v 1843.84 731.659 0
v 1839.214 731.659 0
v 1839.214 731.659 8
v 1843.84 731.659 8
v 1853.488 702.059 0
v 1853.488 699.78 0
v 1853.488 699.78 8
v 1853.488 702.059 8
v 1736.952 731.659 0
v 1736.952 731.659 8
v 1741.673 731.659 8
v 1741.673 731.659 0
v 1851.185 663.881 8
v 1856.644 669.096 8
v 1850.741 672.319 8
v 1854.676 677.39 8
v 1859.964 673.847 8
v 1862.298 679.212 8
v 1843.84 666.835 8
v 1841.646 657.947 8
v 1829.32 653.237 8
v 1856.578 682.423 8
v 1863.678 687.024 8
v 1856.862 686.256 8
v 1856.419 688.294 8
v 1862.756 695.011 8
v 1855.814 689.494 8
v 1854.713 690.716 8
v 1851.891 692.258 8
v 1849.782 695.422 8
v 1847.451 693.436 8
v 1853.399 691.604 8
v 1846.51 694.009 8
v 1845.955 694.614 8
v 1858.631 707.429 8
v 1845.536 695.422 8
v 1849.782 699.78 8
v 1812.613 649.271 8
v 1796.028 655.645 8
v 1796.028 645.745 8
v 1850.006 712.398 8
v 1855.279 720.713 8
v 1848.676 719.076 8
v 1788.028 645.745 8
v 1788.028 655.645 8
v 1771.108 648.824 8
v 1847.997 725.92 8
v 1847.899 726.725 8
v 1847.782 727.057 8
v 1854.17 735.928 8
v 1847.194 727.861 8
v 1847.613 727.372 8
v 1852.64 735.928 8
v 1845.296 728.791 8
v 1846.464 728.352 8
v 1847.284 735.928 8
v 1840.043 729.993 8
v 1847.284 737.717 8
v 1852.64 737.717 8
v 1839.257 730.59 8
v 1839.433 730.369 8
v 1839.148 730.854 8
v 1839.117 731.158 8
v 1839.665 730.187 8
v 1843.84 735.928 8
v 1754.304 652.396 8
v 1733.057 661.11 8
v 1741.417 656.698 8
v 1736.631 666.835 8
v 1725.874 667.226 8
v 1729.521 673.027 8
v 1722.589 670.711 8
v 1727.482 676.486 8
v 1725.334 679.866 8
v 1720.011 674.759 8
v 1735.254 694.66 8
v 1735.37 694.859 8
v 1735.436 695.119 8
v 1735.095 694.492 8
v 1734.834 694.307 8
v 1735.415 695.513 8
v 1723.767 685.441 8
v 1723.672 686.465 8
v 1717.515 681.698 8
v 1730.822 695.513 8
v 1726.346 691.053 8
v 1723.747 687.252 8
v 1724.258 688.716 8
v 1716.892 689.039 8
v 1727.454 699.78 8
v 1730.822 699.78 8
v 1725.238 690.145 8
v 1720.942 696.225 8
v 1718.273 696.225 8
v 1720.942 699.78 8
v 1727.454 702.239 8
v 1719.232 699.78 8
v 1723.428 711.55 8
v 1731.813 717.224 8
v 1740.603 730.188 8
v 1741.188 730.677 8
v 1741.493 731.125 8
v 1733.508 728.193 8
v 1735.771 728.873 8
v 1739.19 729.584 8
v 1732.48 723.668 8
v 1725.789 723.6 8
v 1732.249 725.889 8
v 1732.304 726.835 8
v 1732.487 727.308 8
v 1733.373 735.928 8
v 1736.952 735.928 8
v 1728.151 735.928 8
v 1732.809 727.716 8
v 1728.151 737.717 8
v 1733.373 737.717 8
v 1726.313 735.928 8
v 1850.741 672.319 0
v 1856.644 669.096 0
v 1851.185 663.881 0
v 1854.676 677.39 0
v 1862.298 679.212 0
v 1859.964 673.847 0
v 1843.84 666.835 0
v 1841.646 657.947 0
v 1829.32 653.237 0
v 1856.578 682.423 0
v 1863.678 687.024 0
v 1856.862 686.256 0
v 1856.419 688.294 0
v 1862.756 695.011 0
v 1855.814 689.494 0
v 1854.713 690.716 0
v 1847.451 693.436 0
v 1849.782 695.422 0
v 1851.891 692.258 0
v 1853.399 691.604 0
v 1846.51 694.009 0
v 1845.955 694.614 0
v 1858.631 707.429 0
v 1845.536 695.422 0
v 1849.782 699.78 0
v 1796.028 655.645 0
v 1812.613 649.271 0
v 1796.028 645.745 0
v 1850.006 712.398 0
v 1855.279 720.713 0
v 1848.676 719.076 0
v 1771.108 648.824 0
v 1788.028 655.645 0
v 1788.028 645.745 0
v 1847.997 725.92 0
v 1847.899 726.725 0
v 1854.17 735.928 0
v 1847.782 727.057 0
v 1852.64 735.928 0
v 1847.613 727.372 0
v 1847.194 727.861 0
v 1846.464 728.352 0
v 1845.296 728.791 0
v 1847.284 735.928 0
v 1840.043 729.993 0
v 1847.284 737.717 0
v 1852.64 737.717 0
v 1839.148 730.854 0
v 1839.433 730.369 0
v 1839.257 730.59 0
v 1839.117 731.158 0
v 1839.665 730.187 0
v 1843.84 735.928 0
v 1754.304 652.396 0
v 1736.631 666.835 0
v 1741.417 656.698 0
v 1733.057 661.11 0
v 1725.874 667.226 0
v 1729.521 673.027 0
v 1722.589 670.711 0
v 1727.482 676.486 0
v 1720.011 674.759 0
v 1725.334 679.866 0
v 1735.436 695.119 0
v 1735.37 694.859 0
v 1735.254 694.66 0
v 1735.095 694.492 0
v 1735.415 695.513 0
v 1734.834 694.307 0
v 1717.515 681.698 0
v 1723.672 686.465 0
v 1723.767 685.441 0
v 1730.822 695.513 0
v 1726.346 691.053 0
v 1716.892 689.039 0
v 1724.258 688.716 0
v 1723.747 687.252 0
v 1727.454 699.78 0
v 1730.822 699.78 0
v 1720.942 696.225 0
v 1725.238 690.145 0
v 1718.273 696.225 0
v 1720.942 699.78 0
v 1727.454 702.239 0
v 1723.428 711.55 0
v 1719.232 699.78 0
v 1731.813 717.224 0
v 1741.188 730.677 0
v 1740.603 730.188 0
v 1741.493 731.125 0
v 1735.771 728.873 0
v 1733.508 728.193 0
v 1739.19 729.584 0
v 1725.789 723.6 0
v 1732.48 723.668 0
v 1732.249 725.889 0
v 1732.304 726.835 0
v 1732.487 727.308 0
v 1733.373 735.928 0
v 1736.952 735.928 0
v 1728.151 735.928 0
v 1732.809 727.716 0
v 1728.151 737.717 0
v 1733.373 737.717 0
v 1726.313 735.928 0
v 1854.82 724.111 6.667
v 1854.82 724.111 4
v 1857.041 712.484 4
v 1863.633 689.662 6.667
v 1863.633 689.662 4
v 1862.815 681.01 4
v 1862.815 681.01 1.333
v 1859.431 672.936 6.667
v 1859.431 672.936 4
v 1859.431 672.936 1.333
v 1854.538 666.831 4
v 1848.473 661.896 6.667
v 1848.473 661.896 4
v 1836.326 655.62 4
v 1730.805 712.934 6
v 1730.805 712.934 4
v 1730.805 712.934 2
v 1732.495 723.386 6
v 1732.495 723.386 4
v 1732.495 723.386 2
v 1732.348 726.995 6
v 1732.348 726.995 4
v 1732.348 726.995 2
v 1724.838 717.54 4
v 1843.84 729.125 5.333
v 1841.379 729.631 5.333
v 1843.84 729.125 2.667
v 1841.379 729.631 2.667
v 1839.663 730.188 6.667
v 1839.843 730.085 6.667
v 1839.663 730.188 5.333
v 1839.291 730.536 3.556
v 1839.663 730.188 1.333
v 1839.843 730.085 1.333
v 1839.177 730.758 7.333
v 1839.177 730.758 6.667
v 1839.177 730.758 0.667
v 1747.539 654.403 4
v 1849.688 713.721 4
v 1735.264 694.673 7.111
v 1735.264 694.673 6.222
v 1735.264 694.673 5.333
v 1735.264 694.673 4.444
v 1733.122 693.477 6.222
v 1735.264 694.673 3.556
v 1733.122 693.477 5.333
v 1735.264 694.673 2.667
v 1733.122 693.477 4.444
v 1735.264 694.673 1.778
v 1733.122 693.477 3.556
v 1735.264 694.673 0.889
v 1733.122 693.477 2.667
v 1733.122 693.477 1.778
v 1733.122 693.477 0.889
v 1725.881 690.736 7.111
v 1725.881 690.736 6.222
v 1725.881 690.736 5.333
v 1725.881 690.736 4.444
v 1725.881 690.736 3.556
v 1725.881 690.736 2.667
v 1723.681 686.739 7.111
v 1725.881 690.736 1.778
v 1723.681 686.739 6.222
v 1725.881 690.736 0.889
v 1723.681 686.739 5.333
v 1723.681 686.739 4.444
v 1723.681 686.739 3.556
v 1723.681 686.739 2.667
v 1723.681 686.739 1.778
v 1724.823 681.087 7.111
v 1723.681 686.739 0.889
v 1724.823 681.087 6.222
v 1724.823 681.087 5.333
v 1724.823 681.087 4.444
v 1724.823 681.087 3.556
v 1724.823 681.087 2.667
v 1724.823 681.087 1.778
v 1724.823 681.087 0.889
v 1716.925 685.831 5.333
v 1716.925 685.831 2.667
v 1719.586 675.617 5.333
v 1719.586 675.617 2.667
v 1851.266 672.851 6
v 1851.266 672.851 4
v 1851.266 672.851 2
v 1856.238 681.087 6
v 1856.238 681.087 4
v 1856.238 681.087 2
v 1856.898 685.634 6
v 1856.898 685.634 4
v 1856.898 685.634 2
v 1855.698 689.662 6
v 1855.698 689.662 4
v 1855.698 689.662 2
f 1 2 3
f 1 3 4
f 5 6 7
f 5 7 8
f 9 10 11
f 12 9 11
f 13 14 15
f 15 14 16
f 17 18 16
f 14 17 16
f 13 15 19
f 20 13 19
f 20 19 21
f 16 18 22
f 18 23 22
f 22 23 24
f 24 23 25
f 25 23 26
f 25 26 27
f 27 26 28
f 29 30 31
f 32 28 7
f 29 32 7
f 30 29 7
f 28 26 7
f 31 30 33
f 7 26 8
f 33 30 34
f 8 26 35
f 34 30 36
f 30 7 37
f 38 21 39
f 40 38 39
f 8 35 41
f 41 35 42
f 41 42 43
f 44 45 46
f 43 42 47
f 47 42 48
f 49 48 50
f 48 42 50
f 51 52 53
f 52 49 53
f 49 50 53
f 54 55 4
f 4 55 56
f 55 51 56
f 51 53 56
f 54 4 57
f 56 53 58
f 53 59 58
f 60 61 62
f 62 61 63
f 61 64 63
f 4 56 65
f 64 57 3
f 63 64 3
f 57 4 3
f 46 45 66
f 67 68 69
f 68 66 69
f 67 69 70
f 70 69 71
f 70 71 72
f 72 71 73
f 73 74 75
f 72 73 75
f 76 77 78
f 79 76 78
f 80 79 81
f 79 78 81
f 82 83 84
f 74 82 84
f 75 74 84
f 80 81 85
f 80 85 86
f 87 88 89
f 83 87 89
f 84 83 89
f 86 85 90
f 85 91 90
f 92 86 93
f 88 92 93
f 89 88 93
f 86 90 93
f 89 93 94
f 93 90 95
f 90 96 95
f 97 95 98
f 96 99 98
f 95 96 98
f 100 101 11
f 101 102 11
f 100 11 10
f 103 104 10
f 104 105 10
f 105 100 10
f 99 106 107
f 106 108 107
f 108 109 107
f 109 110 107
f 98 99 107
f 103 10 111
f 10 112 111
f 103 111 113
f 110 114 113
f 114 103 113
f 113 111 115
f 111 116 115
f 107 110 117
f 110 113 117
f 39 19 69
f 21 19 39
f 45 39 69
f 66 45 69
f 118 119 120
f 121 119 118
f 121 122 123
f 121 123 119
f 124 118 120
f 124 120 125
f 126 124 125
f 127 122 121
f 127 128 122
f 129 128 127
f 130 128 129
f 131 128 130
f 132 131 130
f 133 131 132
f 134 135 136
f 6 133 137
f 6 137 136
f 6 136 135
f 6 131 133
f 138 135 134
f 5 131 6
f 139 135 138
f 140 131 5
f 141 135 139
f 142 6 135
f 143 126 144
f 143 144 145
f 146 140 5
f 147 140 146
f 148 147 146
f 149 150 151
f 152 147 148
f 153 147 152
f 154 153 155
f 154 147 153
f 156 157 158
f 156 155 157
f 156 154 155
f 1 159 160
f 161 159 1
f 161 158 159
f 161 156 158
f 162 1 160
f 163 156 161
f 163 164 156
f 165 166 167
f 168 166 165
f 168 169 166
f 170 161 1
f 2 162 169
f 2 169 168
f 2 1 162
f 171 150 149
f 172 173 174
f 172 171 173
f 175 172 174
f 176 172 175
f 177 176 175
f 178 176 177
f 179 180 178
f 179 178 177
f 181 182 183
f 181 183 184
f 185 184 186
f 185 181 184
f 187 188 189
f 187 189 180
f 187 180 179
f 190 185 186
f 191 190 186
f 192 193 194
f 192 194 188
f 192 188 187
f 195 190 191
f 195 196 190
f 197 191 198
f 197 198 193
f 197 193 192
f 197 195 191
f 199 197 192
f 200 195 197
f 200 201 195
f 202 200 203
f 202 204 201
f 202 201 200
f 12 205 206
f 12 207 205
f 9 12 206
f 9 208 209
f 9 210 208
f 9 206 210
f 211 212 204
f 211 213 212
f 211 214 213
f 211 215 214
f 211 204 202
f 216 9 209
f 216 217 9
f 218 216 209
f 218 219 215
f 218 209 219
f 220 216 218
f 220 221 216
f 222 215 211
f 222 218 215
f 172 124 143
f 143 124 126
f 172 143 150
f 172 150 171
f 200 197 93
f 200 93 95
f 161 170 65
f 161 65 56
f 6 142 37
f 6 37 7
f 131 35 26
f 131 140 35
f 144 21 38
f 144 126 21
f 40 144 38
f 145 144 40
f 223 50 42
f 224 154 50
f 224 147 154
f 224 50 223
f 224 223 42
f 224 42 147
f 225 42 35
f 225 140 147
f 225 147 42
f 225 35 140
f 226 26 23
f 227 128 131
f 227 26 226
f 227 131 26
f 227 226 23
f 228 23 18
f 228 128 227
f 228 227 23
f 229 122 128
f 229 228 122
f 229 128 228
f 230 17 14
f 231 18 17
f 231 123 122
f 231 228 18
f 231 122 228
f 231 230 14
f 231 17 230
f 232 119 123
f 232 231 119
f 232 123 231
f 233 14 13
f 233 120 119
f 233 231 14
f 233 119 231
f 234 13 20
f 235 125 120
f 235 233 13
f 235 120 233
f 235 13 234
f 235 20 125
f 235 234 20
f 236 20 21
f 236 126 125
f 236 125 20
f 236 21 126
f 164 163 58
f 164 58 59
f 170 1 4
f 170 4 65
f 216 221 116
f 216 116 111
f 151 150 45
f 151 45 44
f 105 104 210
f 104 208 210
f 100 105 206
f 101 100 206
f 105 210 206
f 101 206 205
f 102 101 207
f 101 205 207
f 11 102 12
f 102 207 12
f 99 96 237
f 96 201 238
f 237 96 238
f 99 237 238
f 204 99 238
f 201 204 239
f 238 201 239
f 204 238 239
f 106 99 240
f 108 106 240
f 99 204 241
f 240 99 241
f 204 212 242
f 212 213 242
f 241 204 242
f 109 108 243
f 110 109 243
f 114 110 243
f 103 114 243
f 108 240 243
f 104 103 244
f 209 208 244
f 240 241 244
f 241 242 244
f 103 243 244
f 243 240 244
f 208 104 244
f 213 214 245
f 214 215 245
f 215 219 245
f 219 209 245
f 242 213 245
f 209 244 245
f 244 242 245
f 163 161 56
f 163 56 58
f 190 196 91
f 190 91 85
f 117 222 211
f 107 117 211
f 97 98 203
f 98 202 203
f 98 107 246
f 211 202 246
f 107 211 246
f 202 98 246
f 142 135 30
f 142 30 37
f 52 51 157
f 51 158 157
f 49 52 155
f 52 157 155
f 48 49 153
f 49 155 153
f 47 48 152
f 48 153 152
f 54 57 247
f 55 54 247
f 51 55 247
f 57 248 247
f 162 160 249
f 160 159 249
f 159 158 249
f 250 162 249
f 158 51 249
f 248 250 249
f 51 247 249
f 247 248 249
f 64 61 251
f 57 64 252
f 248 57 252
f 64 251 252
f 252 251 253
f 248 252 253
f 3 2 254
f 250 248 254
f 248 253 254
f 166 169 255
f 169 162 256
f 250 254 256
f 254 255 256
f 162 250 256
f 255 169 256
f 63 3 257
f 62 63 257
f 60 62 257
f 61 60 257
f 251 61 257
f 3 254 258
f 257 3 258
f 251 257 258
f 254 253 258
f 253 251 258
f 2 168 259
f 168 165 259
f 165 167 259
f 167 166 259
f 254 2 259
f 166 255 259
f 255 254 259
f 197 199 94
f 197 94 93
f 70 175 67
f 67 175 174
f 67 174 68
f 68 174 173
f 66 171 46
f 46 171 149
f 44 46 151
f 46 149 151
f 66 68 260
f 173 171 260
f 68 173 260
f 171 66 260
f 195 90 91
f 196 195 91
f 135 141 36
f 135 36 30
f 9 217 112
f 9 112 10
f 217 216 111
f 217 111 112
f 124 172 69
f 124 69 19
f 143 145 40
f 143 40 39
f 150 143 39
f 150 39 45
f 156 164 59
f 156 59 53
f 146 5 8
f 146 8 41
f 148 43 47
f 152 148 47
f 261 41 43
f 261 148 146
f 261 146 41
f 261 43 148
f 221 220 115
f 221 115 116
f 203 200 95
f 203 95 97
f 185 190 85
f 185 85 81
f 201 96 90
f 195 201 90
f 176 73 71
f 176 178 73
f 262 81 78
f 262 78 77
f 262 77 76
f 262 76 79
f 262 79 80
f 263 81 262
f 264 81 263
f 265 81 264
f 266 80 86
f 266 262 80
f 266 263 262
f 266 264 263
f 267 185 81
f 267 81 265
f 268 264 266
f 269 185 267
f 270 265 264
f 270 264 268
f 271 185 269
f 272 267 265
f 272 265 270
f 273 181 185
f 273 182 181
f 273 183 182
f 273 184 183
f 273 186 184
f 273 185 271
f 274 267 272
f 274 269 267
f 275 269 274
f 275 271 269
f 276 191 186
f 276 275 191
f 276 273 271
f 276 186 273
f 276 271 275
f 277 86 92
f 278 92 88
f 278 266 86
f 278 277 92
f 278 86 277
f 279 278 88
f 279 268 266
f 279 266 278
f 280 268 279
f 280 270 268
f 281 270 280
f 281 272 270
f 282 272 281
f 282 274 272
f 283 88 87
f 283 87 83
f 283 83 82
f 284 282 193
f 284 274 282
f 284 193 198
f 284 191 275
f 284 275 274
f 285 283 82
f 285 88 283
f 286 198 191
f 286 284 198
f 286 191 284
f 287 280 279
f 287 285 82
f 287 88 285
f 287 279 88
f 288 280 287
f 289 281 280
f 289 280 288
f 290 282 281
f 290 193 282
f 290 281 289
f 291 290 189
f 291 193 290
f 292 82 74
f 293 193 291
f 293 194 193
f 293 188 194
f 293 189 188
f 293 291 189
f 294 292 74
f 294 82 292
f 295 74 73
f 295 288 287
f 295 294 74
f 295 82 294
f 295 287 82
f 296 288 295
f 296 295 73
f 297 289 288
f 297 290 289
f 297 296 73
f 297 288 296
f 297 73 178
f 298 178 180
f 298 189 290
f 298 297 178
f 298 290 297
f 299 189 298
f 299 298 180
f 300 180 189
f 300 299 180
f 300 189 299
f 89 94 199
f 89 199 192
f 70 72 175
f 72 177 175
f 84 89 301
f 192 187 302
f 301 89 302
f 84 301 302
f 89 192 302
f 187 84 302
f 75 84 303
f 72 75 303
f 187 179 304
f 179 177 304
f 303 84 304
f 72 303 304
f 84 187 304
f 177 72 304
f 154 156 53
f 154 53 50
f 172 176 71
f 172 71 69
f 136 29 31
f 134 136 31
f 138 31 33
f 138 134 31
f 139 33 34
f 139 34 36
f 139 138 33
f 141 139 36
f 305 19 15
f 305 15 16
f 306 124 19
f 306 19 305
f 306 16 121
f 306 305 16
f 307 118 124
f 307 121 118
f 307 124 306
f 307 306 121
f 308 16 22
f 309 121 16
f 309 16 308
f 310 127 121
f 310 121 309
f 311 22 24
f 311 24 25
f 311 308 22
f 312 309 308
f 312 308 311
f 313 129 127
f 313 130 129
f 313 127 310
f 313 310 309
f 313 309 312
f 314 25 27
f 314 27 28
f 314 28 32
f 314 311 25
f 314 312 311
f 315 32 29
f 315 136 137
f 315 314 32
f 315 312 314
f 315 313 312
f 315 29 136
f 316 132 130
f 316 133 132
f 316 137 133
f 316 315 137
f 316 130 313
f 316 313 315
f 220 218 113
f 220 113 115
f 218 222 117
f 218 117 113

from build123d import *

# Parameters (mm, degrees)
EXTRUDE_1_DEPTH = 8


with BuildPart() as part:
    # 草图1 → 凸台-拉伸1 (new body)
    with BuildSketch(Plane.XY):
        with BuildLine():
            Line((1736.631230142, 666.835487009), (1843.839672203, 666.835487009))
            add(Edge.make_bspline(
                [(1843.839672203, 666.835487009), (1849.048933079, 670.401023189), (1856.658351579, 676.430723923), (1857.432479693, 689.497936137), (1850.935749798, 693.148827691), (1846.435069185, 693.006837672), (1845.535507871, 695.422224725)],
                knots=[0, 0, 0, 0, 0.482118343, 0.698635587, 0.830471272, 1, 1, 1, 1], degree=3))
            Line((1845.535507871, 695.422224725), (1849.781732968, 695.422224725))
            Line((1849.781732968, 695.422224725), (1849.781732968, 699.78011457))
            Line((1849.781732968, 699.78011457), (1853.487957014, 699.78011457))
            Line((1853.487957014, 699.78011457), (1853.487957014, 702.058530991))
            add(Edge.make_bspline(
                [(1853.487957014, 702.058530991), (1848.632575503, 713.452012152), (1847.997134595, 725.919707363)],
                knots=[0, 0, 0, 1, 1, 1], degree=2))
            add(Edge.make_bspline(
                [(1839.213544794, 731.659486678), (1838.724126411, 730.189974813), (1841.254627091, 729.652870368), (1844.699750935, 728.947927357), (1848.016526713, 728.277135284), (1847.997134595, 725.919707363)],
                knots=[0, 0, 0, 0, 0.293171802, 0.50974717, 1, 1, 1, 1], degree=3))
            Line((1839.213544794, 731.659486678), (1843.839672203, 731.659486678))
            Line((1843.839672203, 731.659486678), (1843.839672203, 735.928181623))
            Line((1843.839672203, 735.928181623), (1847.284472905, 735.928181623))
            Line((1847.284472905, 735.928181623), (1847.284472905, 737.717355689))
            Line((1847.284472905, 737.717355689), (1852.639591083, 737.717355689))
            Line((1852.639591083, 737.717355689), (1852.639591083, 735.928181623))
            Line((1852.639591083, 735.928181623), (1854.169624848, 735.928181623))
            add(Edge.make_bspline(
                [(1854.169624848, 735.928181623), (1854.184750531, 728.08871062), (1855.251359205, 716.626457615), (1860.654263864, 701.800018069), (1865.259346512, 688.66974675), (1861.050490469, 672.479807915), (1838.899590966, 651.988779605), (1813.473138043, 650.060778678), (1796.028061186, 645.744745728)],
                knots=[0, 0, 0, 0, 0.175102649, 0.250263336, 0.350923187, 0.478482673, 0.593542959, 1, 1, 1, 1], degree=3))
            Line((1796.028061186, 645.744745728), (1796.028061186, 655.644745728))
            Line((1796.028061186, 655.644745728), (1788.027824374, 655.644745728))
            Line((1788.027824374, 655.644745728), (1788.027824374, 645.744745728))
            add(Edge.make_bspline(
                [(1725.873845255, 667.225811474), (1731.604689548, 660.841165814), (1752.2841737, 650.961536096), (1774.485672575, 648.486012245), (1788.027824374, 645.744745728)],
                knots=[0, 0, 0, 0, 0.379945895, 1, 1, 1, 1], degree=3))
            add(Edge.make_bspline(
                [(1718.273283511, 696.225448414), (1714.79207945, 686.289172356), (1717.90007318, 674.15682682), (1725.873845255, 667.225811474)],
                knots=[0, 0, 0, 0, 1, 1, 1, 1], degree=3))
            Line((1718.273283511, 696.225448414), (1720.941532576, 696.225448414))
            Line((1720.941532576, 696.225448414), (1720.941532576, 699.78011457))
            Line((1720.941532576, 699.78011457), (1719.232185519, 699.78011457))
            add(Edge.make_bspline(
                [(1726.313411794, 735.928181623), (1726.903187357, 717.225749991), (1719.232185519, 699.78011457)],
                knots=[0, 0, 0, 1, 1, 1], degree=2))
            Line((1726.313411794, 735.928181623), (1728.150941915, 735.928181623))
            Line((1728.150941915, 735.928181623), (1728.150941915, 737.717355689))
            Line((1728.150941915, 737.717355689), (1733.373395943, 737.717355689))
            Line((1733.373395943, 737.717355689), (1733.373395943, 735.928181623))
            Line((1733.373395943, 735.928181623), (1736.951744074, 735.928181623))
            Line((1736.951744074, 735.928181623), (1736.951744074, 731.659486678))
            Line((1736.951744074, 731.659486678), (1741.672851851, 731.659486678))
            add(Edge.make_bspline(
                [(1727.454262635, 702.238593182), (1729.449259744, 707.795547847), (1733.026527348, 719.143968784), (1732.328852077, 725.139001902), (1731.622046596, 730.152048234), (1741.017183857, 728.281931394), (1741.672851851, 731.659486678)],
                knots=[0, 0, 0, 0, 0.486670009, 0.533234204, 0.615120311, 1, 1, 1, 1], degree=3))
            Line((1727.454262635, 702.238593182), (1727.454262635, 699.78011457))
            Line((1727.454262635, 699.78011457), (1730.822392388, 699.78011457))
            Line((1730.822392388, 699.78011457), (1730.822392388, 695.512859548))
            Line((1730.822392388, 695.512859548), (1735.415347768, 695.512859548))
            add(Edge.make_bspline(
                [(1735.415347768, 695.512859548), (1735.595580626, 694.569376065), (1734.433647206, 694.140332046), (1732.632189929, 693.209154562), (1729.849058882, 692.151261696), (1726.355479126, 691.577122461), (1724.280306312, 689.04937985), (1723.360323254, 686.486036576), (1724.213408653, 683.794569359), (1725.09930324, 678.816166654), (1728.327866867, 675.900488276), (1729.521089433, 673.026704357)],
                knots=[0, 0, 0, 0, 0.068770033, 0.107166972, 0.20107238, 0.358564254, 0.431585741, 0.50956037, 0.612881734, 0.696964415, 1, 1, 1, 1], degree=3))
            Line((1729.521089433, 673.026704357), (1736.631230142, 666.835487009))
        make_face()
    extrude(amount=EXTRUDE_1_DEPTH)


solid = part.part
